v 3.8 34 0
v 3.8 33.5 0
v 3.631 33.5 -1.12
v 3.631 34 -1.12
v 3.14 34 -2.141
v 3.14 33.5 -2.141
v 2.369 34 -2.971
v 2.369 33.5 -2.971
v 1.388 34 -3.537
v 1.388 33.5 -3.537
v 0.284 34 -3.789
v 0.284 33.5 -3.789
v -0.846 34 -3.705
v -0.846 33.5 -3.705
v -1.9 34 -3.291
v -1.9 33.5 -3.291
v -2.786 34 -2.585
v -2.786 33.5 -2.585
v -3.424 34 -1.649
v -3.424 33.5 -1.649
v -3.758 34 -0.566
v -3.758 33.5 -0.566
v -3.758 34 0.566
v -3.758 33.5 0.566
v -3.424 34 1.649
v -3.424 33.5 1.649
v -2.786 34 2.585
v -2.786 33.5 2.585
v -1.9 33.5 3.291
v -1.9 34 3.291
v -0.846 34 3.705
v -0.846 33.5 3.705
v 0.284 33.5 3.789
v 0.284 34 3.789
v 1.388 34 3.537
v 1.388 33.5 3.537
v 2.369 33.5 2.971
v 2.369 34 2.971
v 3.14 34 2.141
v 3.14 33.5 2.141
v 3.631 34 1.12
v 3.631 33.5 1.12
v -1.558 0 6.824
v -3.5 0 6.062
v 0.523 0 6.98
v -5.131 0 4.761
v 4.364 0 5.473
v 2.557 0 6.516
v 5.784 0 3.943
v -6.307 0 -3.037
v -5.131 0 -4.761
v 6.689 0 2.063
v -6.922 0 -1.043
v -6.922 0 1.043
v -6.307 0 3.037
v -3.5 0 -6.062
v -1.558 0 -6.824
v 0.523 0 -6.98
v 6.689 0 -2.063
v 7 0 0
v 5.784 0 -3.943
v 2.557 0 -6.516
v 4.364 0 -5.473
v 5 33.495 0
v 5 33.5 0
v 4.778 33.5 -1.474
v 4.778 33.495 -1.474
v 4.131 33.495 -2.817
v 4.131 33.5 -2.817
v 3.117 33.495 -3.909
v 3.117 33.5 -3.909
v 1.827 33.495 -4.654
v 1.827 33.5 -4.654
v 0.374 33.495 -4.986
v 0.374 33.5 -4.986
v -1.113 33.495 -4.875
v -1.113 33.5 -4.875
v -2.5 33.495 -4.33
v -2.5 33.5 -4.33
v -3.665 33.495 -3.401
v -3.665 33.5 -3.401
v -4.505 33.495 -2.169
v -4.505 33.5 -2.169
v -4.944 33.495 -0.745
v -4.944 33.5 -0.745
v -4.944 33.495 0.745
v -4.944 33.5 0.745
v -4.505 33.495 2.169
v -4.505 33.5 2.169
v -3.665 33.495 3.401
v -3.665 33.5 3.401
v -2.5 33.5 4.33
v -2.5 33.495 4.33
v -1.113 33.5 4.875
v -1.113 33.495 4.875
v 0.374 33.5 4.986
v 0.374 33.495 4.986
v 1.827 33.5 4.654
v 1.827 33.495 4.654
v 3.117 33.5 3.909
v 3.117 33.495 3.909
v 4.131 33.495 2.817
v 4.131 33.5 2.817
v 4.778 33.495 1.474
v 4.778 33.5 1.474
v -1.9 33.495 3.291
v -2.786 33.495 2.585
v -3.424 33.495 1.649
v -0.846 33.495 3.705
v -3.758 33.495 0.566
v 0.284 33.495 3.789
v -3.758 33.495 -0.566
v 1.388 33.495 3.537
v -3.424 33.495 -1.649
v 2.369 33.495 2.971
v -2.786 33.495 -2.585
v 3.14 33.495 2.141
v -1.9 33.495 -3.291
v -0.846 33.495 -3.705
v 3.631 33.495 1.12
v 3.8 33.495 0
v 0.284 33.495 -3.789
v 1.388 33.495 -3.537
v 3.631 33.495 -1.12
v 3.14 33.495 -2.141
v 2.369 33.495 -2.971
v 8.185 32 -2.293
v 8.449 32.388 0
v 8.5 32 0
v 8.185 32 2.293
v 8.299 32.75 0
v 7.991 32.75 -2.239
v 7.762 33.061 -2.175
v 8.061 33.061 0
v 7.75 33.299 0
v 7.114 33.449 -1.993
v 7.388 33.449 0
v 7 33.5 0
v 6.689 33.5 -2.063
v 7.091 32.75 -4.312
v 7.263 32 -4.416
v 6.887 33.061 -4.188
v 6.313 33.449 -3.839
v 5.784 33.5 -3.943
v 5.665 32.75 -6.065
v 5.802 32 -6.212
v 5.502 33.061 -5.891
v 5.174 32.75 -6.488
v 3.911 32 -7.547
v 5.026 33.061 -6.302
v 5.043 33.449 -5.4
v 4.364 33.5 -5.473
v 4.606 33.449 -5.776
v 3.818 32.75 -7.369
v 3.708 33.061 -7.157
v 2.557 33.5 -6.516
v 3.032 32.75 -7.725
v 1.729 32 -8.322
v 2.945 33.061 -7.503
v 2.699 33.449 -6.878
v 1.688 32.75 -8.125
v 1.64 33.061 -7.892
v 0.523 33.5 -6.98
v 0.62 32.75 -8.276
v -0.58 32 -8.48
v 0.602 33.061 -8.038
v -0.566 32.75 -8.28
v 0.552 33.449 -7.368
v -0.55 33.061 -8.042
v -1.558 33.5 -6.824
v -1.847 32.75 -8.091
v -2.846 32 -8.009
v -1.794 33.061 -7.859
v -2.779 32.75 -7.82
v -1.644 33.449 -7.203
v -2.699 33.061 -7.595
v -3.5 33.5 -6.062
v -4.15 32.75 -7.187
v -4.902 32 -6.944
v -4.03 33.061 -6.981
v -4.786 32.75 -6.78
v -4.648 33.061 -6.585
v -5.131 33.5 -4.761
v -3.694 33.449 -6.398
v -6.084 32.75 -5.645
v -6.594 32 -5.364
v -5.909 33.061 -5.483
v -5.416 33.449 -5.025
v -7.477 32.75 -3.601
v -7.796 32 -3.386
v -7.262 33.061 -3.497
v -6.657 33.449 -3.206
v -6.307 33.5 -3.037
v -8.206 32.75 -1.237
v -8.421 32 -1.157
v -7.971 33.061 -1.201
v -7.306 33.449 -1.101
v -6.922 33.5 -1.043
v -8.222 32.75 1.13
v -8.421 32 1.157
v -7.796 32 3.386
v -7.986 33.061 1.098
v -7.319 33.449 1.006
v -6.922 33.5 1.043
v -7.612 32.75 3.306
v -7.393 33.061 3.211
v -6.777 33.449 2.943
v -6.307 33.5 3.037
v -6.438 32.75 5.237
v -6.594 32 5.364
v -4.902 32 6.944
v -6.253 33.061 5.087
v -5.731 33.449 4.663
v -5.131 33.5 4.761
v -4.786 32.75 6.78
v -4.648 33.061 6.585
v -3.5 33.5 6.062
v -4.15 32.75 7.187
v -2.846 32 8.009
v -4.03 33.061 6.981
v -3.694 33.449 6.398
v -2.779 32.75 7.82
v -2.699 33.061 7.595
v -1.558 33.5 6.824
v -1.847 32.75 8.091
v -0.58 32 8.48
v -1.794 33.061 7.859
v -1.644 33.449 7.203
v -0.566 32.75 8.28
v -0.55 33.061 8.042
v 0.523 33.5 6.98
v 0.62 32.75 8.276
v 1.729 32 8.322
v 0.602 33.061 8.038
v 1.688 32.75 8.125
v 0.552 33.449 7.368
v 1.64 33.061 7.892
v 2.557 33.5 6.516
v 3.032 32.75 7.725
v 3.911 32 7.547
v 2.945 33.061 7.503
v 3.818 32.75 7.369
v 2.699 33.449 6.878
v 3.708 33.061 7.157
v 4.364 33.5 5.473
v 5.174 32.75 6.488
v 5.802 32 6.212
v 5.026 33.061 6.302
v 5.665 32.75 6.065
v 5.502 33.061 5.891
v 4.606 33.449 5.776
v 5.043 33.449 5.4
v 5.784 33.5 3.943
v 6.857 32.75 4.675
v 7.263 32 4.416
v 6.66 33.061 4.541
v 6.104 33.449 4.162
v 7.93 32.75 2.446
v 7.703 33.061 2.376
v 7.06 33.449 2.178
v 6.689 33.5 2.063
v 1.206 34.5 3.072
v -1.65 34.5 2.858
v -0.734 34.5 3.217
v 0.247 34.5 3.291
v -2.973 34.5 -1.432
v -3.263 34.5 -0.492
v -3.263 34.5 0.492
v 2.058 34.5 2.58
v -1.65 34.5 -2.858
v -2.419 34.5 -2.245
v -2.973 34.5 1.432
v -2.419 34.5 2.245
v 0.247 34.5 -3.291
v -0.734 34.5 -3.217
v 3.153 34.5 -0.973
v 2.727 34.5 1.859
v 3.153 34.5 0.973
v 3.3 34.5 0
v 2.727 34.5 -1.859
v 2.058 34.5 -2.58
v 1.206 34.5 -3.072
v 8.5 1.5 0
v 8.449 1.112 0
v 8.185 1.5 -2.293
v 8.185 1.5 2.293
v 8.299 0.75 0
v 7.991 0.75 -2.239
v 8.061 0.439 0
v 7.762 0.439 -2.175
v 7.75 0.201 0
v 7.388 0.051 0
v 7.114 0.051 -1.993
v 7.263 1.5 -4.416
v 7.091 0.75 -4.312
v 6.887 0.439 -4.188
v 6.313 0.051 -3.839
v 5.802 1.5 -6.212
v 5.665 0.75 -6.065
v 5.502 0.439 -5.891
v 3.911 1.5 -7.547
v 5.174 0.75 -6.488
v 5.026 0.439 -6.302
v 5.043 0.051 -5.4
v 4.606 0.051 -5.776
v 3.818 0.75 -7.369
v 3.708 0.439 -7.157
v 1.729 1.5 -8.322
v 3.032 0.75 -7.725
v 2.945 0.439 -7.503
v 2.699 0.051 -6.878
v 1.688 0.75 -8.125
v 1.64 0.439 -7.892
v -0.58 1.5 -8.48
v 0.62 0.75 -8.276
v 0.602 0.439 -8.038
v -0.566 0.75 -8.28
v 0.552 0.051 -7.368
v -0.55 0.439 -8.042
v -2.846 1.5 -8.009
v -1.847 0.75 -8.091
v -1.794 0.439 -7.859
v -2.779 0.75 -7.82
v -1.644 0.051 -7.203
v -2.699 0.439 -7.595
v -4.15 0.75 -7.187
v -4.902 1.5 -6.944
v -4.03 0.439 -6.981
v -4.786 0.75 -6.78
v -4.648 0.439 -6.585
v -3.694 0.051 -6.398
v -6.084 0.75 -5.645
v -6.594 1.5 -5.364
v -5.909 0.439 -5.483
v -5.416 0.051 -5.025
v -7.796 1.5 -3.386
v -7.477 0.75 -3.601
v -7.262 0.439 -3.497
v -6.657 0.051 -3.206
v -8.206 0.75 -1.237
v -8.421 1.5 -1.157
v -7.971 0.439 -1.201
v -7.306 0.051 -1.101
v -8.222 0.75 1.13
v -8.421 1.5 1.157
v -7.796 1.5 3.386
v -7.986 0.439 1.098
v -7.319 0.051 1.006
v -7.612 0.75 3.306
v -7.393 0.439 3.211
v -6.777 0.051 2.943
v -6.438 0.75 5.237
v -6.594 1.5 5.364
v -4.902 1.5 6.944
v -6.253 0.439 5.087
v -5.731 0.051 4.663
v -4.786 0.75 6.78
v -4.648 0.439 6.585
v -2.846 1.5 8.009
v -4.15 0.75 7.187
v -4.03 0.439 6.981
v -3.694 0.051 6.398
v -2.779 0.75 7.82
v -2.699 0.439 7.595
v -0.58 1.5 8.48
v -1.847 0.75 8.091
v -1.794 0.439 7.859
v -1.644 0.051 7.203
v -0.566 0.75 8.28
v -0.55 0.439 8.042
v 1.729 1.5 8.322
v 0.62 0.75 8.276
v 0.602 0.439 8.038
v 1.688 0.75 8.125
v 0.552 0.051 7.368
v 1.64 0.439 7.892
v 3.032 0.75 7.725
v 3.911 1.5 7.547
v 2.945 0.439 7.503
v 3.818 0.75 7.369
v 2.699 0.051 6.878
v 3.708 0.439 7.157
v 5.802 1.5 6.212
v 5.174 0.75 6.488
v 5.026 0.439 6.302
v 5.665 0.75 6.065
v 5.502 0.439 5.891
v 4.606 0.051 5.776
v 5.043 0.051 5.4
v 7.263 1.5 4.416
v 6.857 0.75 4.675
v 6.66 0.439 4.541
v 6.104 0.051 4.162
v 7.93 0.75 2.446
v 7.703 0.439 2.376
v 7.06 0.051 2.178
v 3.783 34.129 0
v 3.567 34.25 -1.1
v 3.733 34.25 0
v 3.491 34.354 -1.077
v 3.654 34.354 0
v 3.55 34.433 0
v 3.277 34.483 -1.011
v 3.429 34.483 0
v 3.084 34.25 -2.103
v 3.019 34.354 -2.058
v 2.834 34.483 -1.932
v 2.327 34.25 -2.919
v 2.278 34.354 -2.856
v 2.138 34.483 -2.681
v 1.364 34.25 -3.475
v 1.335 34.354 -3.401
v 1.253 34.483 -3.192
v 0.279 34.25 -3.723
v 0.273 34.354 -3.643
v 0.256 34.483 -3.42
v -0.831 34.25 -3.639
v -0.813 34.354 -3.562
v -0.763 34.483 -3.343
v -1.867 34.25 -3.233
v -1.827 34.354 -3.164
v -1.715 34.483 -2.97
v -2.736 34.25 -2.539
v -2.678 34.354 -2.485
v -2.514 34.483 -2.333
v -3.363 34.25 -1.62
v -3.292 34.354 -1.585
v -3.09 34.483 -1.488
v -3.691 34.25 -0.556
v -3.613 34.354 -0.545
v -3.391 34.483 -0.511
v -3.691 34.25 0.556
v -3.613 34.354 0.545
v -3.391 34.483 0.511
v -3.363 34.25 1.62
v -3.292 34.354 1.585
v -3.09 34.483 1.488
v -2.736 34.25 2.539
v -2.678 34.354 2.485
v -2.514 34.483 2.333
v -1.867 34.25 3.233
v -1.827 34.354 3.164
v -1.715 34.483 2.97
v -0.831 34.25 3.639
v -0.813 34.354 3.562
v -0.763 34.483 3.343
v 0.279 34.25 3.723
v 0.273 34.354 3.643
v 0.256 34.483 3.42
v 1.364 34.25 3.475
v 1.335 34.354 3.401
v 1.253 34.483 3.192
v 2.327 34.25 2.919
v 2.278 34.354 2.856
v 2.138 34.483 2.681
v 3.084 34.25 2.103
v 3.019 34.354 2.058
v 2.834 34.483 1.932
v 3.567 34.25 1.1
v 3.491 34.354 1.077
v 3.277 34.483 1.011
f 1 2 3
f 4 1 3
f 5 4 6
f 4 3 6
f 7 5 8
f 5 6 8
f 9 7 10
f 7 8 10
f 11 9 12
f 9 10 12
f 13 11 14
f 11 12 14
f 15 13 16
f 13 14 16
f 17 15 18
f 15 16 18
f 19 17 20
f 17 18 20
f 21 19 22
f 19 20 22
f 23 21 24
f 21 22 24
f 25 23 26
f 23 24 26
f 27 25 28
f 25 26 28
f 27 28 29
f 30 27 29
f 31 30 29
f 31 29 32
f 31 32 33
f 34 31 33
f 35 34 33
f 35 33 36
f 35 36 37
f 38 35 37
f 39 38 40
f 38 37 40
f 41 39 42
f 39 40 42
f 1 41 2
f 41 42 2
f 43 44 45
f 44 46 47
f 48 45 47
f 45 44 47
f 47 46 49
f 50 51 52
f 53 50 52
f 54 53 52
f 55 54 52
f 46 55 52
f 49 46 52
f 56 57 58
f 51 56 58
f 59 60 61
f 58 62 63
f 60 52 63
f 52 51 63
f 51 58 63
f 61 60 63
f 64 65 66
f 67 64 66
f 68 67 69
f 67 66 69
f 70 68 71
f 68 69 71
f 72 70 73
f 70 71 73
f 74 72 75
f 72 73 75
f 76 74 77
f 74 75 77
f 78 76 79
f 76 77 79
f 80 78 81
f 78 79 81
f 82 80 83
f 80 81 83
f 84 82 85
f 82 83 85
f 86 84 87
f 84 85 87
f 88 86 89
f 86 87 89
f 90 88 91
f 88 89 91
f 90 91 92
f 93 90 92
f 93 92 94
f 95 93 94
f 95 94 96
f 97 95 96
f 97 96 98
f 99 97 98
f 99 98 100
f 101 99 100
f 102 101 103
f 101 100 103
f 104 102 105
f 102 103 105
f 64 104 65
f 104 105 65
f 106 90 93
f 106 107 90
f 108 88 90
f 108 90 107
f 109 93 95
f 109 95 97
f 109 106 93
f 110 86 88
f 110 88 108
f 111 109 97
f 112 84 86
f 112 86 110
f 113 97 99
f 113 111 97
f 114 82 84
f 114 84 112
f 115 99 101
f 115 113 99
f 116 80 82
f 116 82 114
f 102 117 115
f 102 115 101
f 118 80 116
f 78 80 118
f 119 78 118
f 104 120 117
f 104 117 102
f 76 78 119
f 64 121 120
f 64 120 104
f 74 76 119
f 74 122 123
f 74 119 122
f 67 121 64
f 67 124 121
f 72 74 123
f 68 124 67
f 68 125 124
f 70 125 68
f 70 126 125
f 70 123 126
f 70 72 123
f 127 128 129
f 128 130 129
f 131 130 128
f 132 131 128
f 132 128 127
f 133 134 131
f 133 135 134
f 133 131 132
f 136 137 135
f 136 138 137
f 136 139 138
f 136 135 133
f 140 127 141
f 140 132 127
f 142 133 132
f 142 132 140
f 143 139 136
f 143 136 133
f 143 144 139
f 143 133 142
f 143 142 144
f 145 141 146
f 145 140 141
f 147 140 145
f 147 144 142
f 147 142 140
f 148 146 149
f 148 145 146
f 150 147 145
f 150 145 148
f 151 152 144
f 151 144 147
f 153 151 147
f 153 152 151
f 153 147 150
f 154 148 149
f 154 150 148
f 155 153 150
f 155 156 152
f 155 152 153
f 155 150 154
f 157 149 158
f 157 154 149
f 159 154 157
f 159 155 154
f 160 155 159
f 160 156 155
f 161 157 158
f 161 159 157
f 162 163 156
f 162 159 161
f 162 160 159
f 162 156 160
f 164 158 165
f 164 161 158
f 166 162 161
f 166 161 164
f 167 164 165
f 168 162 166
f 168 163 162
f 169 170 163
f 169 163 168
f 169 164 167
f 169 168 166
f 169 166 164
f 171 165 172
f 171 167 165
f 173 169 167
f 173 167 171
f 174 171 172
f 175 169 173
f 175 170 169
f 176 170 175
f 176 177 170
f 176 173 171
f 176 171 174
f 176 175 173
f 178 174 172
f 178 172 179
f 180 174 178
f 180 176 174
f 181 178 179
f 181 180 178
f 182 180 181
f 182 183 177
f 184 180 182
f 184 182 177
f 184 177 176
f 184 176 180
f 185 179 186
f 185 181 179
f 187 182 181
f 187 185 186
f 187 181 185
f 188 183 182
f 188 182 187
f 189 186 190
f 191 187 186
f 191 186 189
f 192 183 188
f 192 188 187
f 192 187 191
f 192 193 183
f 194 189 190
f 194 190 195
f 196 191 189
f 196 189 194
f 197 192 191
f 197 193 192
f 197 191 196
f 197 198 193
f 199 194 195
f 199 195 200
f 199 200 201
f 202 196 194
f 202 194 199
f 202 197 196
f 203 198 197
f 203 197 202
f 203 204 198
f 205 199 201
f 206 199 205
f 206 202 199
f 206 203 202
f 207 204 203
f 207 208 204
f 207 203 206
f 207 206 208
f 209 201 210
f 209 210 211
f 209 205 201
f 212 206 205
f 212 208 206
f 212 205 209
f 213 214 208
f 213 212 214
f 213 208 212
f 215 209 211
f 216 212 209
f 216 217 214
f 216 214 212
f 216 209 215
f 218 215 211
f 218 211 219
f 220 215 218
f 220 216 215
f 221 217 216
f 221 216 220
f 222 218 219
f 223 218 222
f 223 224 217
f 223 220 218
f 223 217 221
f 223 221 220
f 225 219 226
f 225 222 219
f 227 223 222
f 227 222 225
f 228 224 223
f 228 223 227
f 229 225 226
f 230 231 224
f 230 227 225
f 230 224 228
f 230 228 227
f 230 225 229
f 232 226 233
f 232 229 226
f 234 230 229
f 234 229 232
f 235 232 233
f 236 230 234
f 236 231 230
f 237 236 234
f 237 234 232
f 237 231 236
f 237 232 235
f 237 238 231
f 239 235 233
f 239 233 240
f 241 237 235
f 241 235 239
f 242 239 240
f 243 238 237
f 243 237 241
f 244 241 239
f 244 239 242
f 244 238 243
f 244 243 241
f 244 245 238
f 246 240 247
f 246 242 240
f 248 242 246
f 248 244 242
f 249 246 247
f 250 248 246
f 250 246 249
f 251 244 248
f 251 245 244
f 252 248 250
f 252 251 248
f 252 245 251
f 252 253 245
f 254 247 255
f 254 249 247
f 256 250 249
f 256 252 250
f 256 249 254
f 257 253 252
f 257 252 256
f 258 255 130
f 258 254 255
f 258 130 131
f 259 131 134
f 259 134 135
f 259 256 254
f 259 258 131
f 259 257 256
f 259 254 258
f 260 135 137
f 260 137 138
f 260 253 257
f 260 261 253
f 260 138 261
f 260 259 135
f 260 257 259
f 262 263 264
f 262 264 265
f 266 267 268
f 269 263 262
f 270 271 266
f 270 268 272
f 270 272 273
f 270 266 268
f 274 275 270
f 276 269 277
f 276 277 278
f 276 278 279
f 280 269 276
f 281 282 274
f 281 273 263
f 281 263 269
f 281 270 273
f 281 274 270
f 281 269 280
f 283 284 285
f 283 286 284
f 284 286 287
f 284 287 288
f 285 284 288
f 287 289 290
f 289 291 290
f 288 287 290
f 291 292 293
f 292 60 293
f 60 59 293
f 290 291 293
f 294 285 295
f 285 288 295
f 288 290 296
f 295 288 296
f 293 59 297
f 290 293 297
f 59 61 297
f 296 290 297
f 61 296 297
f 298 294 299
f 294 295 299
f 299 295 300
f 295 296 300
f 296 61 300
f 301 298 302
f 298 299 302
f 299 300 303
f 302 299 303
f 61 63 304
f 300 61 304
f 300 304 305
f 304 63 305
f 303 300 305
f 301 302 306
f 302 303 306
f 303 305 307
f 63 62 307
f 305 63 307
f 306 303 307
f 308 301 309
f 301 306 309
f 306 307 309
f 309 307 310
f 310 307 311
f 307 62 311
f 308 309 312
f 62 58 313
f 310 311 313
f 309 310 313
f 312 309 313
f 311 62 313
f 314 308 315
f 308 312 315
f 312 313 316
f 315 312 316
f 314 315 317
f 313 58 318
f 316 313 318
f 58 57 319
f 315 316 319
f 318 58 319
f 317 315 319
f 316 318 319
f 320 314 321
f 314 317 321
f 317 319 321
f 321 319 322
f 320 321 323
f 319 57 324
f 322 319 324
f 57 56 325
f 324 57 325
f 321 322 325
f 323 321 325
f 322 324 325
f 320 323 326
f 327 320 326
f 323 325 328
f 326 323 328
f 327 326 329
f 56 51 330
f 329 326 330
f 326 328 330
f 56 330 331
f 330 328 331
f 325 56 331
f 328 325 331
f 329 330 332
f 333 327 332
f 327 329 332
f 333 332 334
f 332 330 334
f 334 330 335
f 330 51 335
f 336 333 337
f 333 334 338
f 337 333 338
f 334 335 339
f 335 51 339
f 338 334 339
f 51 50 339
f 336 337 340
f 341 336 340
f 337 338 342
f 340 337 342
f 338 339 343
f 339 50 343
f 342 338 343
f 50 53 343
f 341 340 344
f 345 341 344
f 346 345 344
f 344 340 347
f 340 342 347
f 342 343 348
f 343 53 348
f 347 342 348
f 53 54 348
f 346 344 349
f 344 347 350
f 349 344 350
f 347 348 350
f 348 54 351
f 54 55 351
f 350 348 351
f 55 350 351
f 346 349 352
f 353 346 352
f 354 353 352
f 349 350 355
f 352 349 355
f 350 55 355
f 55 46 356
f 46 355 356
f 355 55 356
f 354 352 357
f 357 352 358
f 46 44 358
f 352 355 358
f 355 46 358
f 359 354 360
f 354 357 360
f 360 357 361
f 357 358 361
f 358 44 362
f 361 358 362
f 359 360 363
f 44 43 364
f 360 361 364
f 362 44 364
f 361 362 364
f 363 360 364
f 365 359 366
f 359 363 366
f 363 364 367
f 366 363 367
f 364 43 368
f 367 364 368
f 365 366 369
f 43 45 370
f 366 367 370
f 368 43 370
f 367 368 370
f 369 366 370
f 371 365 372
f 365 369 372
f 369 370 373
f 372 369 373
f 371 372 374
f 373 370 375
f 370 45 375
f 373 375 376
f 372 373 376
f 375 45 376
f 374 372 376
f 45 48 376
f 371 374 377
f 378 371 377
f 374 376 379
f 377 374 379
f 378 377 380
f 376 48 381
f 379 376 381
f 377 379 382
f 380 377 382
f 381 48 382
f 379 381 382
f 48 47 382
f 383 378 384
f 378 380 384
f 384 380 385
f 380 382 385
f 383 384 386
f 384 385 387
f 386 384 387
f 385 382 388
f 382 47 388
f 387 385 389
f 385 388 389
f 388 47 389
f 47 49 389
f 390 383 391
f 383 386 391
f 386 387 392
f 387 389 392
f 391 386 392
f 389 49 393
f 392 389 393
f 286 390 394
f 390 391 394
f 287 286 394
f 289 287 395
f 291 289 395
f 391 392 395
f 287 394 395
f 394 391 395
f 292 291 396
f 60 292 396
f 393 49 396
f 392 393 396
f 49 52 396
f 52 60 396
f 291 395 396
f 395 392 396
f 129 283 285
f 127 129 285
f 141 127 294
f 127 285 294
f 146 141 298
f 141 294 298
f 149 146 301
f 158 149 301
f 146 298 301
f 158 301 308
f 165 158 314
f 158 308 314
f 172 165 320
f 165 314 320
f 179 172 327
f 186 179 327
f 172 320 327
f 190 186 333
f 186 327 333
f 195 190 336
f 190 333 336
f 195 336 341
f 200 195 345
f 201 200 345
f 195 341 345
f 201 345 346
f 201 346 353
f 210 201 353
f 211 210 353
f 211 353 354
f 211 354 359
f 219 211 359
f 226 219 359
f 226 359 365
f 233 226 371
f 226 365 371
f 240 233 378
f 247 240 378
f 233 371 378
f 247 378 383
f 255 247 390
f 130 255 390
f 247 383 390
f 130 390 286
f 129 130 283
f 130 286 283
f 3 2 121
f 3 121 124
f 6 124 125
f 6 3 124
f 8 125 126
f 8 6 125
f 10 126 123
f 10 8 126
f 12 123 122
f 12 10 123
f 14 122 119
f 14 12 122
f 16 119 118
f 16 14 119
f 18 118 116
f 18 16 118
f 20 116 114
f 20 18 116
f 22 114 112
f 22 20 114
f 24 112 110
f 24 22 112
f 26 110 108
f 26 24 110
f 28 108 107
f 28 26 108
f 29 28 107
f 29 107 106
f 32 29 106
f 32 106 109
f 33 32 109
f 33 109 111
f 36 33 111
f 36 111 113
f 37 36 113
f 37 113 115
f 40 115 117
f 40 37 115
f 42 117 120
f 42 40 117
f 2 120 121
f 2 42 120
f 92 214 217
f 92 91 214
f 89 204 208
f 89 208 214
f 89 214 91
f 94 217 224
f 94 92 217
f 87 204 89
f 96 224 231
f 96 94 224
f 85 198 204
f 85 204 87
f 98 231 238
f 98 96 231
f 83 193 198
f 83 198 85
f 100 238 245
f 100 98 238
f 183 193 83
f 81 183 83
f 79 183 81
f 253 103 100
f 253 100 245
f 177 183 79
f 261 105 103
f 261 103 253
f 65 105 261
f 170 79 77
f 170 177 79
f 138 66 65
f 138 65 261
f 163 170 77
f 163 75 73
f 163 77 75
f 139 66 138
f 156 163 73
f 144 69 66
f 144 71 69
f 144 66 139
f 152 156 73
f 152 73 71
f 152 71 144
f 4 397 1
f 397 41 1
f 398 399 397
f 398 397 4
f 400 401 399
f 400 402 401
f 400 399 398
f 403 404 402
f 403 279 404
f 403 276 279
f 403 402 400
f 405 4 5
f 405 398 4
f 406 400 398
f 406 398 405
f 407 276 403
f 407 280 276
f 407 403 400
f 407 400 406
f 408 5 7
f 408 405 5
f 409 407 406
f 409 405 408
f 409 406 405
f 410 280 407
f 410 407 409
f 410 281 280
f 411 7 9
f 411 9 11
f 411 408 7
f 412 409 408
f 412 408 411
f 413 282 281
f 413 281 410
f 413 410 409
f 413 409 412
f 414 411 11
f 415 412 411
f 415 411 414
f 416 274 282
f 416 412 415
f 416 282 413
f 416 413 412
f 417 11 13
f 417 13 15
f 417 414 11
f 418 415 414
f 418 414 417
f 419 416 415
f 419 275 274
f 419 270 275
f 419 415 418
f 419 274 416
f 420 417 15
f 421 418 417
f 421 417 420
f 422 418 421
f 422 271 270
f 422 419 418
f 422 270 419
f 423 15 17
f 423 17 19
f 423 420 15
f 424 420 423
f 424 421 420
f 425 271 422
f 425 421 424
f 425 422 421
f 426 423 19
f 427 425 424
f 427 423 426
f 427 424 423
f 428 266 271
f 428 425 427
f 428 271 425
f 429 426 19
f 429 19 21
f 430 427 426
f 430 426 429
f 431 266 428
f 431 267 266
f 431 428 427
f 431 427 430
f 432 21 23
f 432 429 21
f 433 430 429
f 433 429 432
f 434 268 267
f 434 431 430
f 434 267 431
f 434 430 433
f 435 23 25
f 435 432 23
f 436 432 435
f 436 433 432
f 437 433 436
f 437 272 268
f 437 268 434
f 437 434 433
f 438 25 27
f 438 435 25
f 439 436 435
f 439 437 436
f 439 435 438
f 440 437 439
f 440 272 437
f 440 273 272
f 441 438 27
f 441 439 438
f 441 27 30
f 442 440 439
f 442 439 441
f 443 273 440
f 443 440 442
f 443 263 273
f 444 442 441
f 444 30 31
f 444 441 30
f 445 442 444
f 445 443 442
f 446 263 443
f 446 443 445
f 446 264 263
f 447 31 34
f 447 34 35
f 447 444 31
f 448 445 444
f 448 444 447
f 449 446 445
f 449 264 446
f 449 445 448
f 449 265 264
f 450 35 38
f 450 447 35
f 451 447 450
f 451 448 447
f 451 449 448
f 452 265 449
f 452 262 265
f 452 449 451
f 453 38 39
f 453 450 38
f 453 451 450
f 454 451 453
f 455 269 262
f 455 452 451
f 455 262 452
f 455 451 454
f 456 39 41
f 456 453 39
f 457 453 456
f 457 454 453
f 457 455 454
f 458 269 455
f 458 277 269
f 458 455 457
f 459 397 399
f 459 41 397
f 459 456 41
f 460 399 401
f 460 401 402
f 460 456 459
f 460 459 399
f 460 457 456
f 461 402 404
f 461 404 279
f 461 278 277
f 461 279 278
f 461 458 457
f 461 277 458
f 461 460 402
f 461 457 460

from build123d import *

# Parameters (mm, degrees)
SKIZZE1_R                       = 8.5
AUFSATZ_LINEAR_AUSTRAGEN1_DEPTH = 33.5
SKIZZE2_R                       = 3.799988553
AUFSATZ_LINEAR_AUSTRAGEN2_DEPTH = 1
VERRUNDUNG1_R                   = 1.5
VERRUNDUNG2_R                   = 0.5
SKIZZE3_R                       = 5
SKIZZE3_R_2                     = 3.799988553
SCHNITT_LINEAR_AUSTRAGEN1_DEPTH = 0.005


with BuildPart() as part:
    # Skizze1 → Aufsatz-Linear austragen1 (new body)
    with BuildSketch(Plane(origin=(0, 0, 0), x_dir=(1, 0, 0), z_dir=(0, 1, 0))):
        Circle(SKIZZE1_R)
    extrude(amount=AUFSATZ_LINEAR_AUSTRAGEN1_DEPTH)

    # Skizze2 → Aufsatz-Linear austragen2 (add)
    with BuildSketch(Plane(origin=(0, 33.5, 0), x_dir=(1, 0, 0), z_dir=(0, 1, 0))):
        Circle(SKIZZE2_R)
    extrude(amount=AUFSATZ_LINEAR_AUSTRAGEN2_DEPTH)

    # Verrundung1
    verrundung1_edges = [part.edges().sort_by_distance(p)[0] for p in [
        (-8.5, 0, 0),
        (-8.5, 33.5, 0),
    ]]
    fillet(verrundung1_edges, radius=VERRUNDUNG1_R)

    # Verrundung2
    verrundung2_edges = [part.edges().sort_by_distance(p)[0] for p in [
        (-3.799988553, 34.5, 0),
    ]]
    fillet(verrundung2_edges, radius=VERRUNDUNG2_R)

    # Skizze3 → Schnitt-Linear austragen1 (cut)
    with BuildSketch(Plane(origin=(0, 33.5, 0), x_dir=(1, 0, 0), z_dir=(0, 1, 0))):
        Circle(SKIZZE3_R)
        Circle(SKIZZE3_R_2, mode=Mode.SUBTRACT)
    extrude(amount=-SCHNITT_LINEAR_AUSTRAGEN1_DEPTH, mode=Mode.SUBTRACT)


solid = part.part
